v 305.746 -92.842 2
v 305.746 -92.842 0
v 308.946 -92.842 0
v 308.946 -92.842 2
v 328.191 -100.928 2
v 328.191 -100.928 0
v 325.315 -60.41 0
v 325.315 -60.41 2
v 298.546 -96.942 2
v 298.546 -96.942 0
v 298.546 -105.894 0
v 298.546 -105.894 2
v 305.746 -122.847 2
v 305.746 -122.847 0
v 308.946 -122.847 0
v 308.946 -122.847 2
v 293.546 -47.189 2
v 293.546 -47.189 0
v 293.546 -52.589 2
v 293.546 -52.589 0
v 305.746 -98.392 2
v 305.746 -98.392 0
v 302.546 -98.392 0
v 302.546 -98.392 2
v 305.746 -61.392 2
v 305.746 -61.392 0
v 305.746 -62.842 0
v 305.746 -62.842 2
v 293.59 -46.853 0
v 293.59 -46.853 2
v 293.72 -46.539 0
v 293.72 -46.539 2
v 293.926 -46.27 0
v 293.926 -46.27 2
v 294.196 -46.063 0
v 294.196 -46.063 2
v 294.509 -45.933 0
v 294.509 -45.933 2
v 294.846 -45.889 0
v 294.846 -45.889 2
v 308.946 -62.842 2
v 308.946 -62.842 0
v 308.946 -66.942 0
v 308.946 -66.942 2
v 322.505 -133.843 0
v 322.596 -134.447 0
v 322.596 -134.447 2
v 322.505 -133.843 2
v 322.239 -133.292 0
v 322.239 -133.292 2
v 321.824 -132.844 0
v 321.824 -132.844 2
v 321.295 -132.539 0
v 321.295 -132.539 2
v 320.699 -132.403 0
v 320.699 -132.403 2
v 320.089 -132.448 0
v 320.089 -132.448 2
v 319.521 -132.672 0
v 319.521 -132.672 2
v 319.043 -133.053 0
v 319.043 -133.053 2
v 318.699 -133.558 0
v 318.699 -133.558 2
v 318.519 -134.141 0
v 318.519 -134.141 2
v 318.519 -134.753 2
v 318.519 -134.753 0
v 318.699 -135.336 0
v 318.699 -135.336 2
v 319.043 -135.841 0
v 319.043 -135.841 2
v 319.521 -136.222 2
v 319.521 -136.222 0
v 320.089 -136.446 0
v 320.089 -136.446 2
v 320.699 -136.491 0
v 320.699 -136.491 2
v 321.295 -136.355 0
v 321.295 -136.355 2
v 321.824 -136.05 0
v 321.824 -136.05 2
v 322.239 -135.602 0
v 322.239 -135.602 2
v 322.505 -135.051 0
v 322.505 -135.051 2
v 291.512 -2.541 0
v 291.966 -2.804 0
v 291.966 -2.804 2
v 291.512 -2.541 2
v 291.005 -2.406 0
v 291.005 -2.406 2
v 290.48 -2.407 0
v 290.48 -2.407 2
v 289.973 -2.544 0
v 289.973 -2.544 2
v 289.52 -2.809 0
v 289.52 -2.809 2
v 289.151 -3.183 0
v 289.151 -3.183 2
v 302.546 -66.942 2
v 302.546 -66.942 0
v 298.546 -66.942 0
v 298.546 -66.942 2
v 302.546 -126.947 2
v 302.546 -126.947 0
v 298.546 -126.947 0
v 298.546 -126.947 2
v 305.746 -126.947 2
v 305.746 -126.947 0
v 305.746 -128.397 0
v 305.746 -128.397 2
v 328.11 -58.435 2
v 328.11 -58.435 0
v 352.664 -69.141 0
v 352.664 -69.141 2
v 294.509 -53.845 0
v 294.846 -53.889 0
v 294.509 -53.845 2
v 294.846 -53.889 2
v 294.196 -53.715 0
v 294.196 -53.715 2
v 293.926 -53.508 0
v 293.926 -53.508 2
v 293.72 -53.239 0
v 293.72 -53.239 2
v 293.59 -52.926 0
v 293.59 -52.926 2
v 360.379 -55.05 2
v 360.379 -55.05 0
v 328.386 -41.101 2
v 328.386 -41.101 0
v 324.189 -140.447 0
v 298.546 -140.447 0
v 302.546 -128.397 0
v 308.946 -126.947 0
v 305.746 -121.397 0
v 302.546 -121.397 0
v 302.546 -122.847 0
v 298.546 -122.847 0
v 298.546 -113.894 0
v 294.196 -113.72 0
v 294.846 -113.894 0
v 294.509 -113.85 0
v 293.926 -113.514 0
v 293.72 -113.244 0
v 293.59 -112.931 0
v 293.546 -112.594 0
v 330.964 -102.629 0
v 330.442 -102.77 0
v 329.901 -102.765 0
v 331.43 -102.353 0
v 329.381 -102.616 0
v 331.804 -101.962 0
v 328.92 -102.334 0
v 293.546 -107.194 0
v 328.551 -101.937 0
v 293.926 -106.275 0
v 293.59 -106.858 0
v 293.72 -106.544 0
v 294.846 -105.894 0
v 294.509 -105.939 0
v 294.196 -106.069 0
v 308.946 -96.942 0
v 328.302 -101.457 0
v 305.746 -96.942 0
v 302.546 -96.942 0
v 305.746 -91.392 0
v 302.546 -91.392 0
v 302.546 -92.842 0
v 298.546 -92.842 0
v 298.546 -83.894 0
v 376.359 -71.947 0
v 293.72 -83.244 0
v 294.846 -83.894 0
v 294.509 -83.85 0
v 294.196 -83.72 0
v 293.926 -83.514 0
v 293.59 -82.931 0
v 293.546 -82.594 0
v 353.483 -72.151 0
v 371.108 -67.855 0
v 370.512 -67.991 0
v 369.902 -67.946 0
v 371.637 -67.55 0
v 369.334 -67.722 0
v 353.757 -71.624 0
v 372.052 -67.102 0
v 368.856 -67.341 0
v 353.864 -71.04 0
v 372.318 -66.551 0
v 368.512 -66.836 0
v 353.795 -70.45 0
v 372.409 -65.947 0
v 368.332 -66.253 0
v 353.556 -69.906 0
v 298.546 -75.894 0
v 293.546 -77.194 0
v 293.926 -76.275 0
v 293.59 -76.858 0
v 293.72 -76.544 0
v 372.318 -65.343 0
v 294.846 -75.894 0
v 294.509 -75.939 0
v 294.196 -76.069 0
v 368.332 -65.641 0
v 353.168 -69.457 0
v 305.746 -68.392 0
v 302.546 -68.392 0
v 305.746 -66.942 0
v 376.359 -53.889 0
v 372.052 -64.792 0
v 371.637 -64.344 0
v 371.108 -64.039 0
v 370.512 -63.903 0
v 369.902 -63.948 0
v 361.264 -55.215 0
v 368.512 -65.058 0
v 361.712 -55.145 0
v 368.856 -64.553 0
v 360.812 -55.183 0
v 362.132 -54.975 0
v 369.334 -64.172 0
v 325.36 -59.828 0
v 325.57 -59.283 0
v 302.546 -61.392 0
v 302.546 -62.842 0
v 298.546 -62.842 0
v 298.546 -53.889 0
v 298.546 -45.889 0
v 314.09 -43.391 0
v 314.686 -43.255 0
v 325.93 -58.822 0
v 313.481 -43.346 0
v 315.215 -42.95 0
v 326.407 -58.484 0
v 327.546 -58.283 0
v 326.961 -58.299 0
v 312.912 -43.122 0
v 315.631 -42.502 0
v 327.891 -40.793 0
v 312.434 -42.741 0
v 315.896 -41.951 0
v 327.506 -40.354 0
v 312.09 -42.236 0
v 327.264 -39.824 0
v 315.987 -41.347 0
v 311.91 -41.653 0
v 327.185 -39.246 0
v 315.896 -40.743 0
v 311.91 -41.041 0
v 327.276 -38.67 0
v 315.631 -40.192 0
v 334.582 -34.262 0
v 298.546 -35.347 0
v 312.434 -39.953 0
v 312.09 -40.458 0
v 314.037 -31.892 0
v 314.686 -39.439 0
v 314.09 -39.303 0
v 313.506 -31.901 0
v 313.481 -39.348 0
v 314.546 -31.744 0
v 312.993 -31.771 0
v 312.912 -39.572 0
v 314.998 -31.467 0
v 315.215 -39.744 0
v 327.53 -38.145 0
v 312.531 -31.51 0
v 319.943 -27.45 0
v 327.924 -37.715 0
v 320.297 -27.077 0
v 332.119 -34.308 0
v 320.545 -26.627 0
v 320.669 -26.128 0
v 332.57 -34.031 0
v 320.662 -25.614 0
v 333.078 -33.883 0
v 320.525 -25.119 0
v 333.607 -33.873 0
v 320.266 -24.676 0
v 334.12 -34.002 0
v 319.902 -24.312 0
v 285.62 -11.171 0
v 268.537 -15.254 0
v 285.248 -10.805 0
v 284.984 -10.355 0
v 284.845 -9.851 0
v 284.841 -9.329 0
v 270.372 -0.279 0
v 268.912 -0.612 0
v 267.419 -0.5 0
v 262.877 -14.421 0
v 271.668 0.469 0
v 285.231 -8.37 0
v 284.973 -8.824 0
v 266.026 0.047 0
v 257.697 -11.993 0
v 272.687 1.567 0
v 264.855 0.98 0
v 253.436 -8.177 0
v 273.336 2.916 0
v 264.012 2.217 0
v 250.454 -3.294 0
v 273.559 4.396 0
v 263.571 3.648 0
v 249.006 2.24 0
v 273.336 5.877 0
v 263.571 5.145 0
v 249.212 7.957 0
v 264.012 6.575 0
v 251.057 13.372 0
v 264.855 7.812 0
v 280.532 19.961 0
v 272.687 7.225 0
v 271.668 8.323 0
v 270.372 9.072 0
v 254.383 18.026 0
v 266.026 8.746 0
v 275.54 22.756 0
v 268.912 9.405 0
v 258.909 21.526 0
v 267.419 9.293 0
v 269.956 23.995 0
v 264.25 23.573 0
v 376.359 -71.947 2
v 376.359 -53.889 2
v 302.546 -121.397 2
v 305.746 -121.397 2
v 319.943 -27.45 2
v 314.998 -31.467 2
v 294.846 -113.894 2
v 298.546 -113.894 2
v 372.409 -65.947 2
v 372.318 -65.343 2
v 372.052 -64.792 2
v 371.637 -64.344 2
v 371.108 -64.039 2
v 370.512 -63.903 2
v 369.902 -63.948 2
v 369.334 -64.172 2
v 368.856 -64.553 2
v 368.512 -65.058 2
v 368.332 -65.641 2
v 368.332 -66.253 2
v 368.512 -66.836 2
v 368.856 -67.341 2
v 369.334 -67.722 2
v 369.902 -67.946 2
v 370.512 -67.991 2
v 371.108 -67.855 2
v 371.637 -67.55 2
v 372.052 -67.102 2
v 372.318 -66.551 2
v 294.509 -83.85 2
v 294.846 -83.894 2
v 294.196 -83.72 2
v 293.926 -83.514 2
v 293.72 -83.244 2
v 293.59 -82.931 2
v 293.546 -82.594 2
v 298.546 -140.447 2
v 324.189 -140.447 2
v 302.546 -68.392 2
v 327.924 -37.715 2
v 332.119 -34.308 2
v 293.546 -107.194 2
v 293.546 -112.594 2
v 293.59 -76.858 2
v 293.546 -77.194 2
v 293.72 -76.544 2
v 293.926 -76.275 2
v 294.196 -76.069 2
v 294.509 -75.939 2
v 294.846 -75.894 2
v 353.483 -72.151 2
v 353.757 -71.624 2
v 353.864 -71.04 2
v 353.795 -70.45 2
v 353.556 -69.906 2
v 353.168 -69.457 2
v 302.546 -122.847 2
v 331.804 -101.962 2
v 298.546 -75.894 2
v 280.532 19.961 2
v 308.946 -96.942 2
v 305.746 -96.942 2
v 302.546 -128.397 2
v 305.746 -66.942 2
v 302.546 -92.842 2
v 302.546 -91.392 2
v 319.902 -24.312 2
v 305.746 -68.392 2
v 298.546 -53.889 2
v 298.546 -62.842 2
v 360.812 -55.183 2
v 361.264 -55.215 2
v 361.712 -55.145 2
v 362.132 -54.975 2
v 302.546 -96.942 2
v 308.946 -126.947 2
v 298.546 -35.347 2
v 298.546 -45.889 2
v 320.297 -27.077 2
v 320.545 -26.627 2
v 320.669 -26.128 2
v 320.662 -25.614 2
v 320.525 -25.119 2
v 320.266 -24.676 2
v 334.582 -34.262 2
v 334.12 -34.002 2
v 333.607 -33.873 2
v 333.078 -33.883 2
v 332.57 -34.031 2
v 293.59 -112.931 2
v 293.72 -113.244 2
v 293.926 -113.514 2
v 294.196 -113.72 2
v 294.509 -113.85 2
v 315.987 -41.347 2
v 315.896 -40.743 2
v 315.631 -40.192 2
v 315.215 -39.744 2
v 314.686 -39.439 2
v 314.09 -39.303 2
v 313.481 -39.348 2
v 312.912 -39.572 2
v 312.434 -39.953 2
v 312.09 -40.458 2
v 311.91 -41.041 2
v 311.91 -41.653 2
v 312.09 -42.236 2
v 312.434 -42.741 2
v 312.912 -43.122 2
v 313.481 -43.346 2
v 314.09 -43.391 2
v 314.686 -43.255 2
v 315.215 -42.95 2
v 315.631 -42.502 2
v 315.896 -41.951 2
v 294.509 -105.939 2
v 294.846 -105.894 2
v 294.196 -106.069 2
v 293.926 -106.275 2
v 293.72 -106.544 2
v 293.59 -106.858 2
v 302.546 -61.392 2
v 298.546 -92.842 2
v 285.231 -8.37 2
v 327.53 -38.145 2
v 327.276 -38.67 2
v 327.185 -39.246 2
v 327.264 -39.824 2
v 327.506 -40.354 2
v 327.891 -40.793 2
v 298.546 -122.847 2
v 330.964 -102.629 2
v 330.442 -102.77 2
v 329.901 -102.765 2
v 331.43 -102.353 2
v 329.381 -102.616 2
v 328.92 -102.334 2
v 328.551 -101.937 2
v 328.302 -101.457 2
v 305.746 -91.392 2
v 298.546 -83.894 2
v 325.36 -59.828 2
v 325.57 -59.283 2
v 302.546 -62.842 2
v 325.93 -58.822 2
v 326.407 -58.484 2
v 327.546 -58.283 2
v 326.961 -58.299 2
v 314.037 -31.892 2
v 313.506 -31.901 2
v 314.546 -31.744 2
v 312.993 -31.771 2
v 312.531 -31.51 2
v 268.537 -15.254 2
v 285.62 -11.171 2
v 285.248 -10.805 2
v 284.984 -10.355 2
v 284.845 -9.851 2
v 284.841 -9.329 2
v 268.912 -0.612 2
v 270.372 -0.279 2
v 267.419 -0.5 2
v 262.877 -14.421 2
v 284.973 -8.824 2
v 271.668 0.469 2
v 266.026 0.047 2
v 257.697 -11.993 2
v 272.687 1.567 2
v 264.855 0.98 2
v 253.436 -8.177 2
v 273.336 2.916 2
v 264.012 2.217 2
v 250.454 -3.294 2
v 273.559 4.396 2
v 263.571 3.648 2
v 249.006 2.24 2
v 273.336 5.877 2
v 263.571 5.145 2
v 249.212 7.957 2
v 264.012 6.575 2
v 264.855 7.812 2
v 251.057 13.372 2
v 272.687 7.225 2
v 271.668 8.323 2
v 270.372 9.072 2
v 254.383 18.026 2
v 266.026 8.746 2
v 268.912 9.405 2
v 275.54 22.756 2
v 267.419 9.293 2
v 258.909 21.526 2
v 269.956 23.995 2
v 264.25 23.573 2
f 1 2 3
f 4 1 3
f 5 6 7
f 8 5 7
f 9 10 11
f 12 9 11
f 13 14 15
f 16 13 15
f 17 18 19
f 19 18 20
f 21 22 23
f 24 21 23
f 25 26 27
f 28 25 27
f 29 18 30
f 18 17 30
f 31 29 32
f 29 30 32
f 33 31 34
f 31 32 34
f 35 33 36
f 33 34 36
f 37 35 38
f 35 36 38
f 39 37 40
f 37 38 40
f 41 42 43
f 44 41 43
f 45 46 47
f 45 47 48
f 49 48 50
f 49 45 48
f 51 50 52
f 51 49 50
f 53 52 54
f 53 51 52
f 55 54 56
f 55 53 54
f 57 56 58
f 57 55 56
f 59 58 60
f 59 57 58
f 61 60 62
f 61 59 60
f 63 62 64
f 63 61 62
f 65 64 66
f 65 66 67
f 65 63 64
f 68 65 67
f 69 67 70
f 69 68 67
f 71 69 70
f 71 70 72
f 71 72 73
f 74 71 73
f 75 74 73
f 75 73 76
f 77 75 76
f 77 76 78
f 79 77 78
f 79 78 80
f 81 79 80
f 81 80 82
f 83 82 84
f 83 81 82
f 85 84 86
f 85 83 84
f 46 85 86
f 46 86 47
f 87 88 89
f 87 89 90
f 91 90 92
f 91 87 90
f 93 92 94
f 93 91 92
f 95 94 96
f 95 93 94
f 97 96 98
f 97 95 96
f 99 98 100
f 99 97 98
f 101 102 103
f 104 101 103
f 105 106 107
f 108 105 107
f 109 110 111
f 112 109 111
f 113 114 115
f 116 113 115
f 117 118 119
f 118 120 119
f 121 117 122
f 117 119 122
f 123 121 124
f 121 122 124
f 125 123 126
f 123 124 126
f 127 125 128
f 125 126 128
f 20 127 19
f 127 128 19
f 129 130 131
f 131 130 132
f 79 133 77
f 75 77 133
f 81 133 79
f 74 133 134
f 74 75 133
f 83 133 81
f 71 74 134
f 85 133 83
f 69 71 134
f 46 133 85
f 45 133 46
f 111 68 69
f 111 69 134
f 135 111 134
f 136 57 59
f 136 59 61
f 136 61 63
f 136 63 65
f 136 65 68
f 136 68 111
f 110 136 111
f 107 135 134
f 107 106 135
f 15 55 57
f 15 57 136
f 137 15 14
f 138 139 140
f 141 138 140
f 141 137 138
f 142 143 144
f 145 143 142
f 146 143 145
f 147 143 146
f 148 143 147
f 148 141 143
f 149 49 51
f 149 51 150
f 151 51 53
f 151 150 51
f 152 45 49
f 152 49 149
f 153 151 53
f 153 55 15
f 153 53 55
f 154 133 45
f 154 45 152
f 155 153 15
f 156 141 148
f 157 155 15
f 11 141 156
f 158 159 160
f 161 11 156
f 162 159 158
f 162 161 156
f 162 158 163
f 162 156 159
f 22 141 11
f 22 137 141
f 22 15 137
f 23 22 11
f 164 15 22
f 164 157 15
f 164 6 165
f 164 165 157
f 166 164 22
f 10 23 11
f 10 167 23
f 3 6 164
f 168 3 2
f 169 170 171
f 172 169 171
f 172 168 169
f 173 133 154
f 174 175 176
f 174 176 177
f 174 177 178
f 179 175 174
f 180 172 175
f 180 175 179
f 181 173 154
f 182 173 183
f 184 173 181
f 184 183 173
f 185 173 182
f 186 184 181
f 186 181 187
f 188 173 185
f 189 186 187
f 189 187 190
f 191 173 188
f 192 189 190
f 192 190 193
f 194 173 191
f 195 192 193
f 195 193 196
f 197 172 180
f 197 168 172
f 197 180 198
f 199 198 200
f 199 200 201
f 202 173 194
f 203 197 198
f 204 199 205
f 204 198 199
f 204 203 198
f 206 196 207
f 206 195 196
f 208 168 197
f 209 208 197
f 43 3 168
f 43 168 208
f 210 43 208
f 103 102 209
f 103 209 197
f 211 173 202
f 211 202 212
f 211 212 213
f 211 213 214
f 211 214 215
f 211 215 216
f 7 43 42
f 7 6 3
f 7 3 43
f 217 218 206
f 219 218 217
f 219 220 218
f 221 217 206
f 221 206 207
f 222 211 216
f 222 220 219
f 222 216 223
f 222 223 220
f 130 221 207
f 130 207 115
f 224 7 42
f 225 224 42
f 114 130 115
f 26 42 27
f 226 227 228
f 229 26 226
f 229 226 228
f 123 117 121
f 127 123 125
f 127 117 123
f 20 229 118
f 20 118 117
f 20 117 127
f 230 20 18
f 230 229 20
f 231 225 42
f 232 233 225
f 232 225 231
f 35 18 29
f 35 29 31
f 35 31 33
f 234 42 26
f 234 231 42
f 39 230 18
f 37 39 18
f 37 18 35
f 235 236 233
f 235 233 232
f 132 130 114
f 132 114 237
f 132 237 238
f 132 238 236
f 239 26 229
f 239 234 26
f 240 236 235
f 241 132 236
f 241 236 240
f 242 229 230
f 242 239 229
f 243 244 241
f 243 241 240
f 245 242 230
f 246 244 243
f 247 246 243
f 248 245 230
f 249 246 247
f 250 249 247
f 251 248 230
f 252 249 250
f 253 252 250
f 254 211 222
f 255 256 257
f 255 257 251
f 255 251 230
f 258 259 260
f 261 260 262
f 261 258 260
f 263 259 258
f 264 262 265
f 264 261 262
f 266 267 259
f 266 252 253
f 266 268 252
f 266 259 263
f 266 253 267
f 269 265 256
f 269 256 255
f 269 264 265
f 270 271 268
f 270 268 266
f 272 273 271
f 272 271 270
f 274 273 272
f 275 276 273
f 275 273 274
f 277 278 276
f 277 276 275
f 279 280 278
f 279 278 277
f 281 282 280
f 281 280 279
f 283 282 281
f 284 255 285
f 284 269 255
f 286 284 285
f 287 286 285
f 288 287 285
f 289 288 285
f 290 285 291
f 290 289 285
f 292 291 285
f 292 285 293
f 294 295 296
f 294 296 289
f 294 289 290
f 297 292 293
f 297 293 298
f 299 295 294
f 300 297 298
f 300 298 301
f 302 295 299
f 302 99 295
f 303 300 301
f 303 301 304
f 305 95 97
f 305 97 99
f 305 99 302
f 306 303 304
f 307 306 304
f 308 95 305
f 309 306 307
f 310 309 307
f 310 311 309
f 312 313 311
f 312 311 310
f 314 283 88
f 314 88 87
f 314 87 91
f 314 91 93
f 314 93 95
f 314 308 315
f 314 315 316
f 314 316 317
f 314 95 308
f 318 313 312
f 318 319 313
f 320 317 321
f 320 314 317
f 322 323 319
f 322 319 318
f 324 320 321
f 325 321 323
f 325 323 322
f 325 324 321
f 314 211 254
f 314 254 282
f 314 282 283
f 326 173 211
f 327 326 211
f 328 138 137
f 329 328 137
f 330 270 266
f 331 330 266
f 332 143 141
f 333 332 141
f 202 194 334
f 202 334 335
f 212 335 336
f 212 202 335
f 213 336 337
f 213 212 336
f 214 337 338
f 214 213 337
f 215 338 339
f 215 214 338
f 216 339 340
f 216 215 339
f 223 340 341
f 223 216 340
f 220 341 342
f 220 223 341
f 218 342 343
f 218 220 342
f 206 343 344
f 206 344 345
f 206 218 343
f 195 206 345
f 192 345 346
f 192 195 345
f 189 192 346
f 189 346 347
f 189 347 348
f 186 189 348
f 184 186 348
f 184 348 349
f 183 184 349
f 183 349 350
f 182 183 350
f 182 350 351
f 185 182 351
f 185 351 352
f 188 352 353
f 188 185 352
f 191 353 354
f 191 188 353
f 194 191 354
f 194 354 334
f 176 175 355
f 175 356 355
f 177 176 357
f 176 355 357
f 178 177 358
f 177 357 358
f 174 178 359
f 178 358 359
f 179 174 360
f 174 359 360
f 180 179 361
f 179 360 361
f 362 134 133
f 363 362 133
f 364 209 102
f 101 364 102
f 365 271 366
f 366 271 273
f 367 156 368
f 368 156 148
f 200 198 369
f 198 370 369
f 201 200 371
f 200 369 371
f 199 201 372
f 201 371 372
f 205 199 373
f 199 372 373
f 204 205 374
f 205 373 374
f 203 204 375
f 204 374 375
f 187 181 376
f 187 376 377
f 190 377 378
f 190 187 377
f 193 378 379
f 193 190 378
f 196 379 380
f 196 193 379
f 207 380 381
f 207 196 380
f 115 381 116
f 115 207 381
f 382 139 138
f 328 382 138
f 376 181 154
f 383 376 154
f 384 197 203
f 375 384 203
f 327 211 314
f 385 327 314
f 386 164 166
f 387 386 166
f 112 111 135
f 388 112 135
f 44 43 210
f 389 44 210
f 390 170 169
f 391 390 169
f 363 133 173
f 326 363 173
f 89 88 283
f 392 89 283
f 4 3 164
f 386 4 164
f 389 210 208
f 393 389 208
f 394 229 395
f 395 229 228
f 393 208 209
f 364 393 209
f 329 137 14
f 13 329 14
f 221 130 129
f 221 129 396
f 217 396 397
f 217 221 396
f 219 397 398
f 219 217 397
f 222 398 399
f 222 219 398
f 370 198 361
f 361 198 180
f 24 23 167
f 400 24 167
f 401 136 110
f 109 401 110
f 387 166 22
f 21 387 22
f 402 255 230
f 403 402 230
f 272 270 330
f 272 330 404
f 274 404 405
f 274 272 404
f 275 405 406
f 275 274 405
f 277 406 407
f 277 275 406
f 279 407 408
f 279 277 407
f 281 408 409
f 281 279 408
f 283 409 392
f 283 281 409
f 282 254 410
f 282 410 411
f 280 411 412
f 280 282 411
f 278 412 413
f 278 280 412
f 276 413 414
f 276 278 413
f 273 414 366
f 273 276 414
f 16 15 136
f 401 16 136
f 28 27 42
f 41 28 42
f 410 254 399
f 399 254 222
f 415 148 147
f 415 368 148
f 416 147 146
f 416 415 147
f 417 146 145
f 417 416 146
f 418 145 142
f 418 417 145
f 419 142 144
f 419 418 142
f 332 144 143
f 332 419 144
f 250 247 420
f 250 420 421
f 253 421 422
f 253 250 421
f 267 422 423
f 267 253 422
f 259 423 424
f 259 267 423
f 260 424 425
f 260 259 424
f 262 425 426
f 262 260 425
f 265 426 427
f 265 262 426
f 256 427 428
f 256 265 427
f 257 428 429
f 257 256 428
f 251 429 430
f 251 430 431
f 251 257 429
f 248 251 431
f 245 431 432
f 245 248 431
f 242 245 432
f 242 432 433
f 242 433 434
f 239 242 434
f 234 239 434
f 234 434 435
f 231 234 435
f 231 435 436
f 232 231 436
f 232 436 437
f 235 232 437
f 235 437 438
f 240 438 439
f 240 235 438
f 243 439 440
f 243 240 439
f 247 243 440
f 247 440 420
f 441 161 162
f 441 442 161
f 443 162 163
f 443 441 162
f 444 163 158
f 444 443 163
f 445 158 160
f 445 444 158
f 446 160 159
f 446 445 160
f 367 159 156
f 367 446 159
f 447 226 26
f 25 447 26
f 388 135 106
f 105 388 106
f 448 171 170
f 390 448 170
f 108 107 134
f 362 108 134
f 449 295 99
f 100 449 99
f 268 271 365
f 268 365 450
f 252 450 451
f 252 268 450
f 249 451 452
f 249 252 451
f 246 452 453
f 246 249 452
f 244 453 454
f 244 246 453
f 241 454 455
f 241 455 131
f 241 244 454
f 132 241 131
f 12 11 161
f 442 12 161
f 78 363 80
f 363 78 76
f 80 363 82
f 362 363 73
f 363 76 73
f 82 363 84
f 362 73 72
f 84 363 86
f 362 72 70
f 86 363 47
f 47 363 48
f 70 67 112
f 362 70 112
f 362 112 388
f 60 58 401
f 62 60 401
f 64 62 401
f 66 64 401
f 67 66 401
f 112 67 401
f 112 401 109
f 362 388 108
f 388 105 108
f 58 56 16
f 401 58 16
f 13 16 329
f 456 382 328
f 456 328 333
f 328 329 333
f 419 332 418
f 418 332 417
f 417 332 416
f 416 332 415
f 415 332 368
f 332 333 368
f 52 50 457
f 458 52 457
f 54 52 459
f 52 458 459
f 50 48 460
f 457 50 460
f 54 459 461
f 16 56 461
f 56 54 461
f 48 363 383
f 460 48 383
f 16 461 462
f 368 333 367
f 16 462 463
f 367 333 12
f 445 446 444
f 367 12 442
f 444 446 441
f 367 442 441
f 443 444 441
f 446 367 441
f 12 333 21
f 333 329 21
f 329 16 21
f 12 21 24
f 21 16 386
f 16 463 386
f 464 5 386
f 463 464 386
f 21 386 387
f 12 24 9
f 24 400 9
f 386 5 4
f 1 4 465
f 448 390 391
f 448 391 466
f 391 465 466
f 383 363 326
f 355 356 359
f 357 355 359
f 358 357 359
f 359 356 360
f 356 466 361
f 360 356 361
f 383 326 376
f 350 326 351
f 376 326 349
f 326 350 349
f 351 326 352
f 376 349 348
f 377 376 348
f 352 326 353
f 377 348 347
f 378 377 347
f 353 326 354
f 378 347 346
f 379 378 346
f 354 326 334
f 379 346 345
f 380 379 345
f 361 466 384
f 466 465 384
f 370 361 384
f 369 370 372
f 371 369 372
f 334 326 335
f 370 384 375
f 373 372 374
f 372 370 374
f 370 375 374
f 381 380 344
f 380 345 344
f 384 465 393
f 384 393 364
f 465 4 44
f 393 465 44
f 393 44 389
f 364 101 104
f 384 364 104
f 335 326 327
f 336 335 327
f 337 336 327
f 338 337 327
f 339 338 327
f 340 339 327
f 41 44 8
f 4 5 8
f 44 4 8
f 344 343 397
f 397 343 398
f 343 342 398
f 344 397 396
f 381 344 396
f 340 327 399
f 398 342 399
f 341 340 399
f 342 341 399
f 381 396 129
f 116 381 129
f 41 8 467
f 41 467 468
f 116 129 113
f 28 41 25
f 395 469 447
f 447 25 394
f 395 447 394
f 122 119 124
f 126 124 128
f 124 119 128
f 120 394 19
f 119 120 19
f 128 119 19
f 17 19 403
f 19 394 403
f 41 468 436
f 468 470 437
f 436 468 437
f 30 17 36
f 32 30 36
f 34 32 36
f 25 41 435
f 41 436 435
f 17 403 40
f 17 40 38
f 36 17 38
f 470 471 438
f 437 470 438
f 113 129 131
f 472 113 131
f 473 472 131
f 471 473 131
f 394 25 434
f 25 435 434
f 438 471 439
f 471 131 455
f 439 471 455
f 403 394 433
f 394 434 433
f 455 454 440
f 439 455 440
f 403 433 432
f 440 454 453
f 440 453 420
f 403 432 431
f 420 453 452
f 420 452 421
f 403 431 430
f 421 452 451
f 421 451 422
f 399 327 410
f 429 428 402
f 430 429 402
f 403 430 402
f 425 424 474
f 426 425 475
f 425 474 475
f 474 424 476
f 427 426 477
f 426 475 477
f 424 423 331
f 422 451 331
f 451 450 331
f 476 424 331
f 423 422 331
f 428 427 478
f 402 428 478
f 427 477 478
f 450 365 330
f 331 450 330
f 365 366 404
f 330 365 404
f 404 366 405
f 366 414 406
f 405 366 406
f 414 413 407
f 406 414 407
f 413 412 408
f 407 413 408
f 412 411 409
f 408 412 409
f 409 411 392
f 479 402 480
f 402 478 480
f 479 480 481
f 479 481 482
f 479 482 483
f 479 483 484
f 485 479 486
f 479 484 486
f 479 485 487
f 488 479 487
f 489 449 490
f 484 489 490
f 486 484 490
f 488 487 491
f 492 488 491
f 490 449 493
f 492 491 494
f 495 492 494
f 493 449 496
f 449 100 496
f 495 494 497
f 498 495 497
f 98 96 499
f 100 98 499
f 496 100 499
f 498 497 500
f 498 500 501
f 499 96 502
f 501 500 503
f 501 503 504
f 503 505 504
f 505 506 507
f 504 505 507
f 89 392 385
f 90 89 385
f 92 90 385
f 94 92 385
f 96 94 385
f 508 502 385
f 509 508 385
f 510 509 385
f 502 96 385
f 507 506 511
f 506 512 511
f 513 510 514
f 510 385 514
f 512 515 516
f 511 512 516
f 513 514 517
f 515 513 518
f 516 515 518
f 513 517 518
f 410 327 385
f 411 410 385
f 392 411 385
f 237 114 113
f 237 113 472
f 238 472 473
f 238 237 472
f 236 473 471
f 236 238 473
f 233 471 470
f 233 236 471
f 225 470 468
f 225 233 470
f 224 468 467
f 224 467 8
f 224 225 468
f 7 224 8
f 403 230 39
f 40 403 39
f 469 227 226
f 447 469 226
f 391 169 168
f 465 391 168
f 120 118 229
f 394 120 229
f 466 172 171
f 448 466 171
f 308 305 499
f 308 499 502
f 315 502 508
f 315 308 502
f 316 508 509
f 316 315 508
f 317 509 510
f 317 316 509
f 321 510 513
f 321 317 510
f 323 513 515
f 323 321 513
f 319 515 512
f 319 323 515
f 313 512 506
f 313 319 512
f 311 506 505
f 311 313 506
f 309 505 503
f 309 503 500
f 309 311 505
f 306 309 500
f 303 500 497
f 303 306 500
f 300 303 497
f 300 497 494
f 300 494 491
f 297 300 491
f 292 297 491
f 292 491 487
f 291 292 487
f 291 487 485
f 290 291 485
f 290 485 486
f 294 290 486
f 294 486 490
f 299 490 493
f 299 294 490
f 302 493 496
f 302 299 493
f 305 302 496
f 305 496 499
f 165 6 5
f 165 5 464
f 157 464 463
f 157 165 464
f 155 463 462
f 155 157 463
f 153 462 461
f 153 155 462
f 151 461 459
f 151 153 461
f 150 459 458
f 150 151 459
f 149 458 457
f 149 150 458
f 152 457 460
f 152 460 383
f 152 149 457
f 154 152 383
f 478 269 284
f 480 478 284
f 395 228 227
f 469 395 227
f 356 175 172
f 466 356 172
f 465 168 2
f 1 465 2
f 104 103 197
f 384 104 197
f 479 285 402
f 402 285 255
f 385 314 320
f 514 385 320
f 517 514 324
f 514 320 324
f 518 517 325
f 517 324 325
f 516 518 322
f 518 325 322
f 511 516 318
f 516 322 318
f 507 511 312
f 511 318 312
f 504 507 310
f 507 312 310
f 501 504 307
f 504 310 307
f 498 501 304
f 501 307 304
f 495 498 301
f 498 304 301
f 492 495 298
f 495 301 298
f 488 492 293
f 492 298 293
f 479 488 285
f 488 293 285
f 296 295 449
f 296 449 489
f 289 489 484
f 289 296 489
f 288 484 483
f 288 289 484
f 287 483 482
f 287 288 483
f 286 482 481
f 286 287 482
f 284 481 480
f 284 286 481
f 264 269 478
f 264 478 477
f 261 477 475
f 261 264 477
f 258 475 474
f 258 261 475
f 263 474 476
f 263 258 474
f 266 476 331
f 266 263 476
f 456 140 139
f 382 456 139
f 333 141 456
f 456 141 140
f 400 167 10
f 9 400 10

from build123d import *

# Parameters (mm, degrees)
SKETCH_1_R      = 5.0225
SKETCH_1_R_2    = 2.05
EXTRUDE_1_DEPTH = 2
FILLET_1_R      = 2
FILLET_2_R      = 1.3


with BuildPart() as part:
    # 草图1 → 凸台-拉伸1 (new body)
    with BuildSketch(Plane.XY):
        with BuildLine():
            Line((298.545628784, -83.894391363), (298.545628784, -92.841778663))
            Line((298.545628784, -92.841778663), (302.545628784, -92.841778663))
            Line((302.545628784, -92.841778663), (302.545628784, -91.391778663))
            Line((302.545628784, -91.391778663), (305.745628784, -91.391778663))
            Line((305.745628784, -91.391778663), (305.745628784, -92.841778663))
            Line((305.745628784, -92.841778663), (308.945628784, -92.841778663))
            Line((308.945628784, -92.841778663), (308.945628784, -96.941778663))
            Line((308.945628784, -96.941778663), (305.745628784, -96.941778663))
            Line((305.745628784, -96.941778663), (305.745628784, -98.391778663))
            Line((305.745628784, -98.391778663), (302.545628784, -98.391778663))
            Line((302.545628784, -98.391778663), (302.545628784, -96.941778663))
            Line((302.545628784, -96.941778663), (298.545628784, -96.941778663))
            Line((298.545628784, -96.941778663), (298.545628784, -105.894391358))
            Line((298.545628784, -105.894391358), (293.545628784, -105.894391358))
            Line((293.545628784, -105.894391358), (293.545628784, -113.894391358))
            Line((293.545628784, -113.894391358), (298.545628784, -113.894391358))
            Line((298.545628784, -113.894391358), (298.545628784, -122.847004054))
            Line((298.545628784, -122.847004054), (302.545628784, -122.847004054))
            Line((302.545628784, -122.847004054), (302.545628784, -121.397004054))
            Line((302.545628784, -121.397004054), (305.745628784, -121.397004054))
            Line((305.745628784, -121.397004054), (305.745628784, -122.847004054))
            Line((305.745628784, -122.847004054), (308.945628784, -122.847004054))
            Line((308.945628784, -122.847004054), (308.945628784, -126.947004054))
            Line((308.945628784, -126.947004054), (305.745628784, -126.947004054))
            Line((305.745628784, -126.947004054), (305.745628784, -128.397004054))
            Line((305.745628784, -128.397004054), (302.545628784, -128.397004054))
            Line((302.545628784, -128.397004054), (302.545628784, -126.947004054))
            Line((302.545628784, -126.947004054), (298.545628784, -126.947004054))
            Line((298.545628784, -126.947004054), (298.545628784, -140.447004054))
            Line((298.545628784, -140.447004054), (324.188862368, -140.447004054))
            Line((324.188862368, -140.447004054), (376.358604426, -71.946984141))
            Line((376.358604426, -71.946984141), (376.358604426, -53.889165972))
            Line((376.358604426, -53.889165972), (280.531751023, 19.960524179))
            ThreePointArc((280.531751023, 19.960524179), (249.936430553, 10.731954958), (268.536987634, -15.253798847))
            Line((268.536987634, -15.253798847), (298.545628784, -35.346984141))
            Line((298.545628784, -35.346984141), (298.545628784, -45.889165972))
            Line((298.545628784, -45.889165972), (293.545628784, -45.889165972))
            Line((293.545628784, -45.889165972), (293.545628784, -53.889165972))
            Line((293.545628784, -53.889165972), (298.545628784, -53.889165972))
            Line((298.545628784, -53.889165972), (298.545628784, -62.841778668))
            Line((298.545628784, -62.841778668), (302.545628784, -62.841778668))
            Line((302.545628784, -62.841778668), (302.545628784, -61.391778668))
            Line((302.545628784, -61.391778668), (305.745628784, -61.391778668))
            Line((305.745628784, -61.391778668), (305.745628784, -62.841778668))
            Line((305.745628784, -62.841778668), (308.945628784, -62.841778668))
            Line((308.945628784, -62.841778668), (308.945628784, -66.941778668))
            Line((308.945628784, -66.941778668), (305.745628784, -66.941778668))
            Line((305.745628784, -66.941778668), (305.745628784, -68.391778668))
            Line((305.745628784, -68.391778668), (302.545628784, -68.391778668))
            Line((302.545628784, -68.391778668), (302.545628784, -66.941778668))
            Line((302.545628784, -66.941778668), (298.545628784, -66.941778668))
            Line((298.545628784, -66.941778668), (298.545628784, -75.894391363))
            Line((298.545628784, -75.894391363), (293.545628784, -75.894391363))
            Line((293.545628784, -75.894391363), (293.545628784, -83.894391363))
            Line((293.545628784, -83.894391363), (298.545628784, -83.894391363))
        make_face()
        with Locations((268.536987634, 4.396201153)):
            Circle(SKETCH_1_R, mode=Mode.SUBTRACT)
        with Locations((320.545628784, -134.447004054)):
            Circle(SKETCH_1_R_2, mode=Mode.SUBTRACT)
        with Locations((370.358604426, -65.946984141)):
            Circle(SKETCH_1_R_2, mode=Mode.SUBTRACT)
        with Locations((313.936987634, -41.346984141)):
            Circle(SKETCH_1_R_2, mode=Mode.SUBTRACT)
        Polygon((354.947285032, -70.136765586), (328.579617375, -106.396108383), (325.08144343, -57.115165973), align=None, mode=Mode.SUBTRACT)
        Polygon((333.332304748, -33.322065963), (362.131919364, -54.975351392), (362.3086526, -55.891681452), (325.3728981, -39.787577877), align=None, mode=Mode.SUBTRACT)
        Polygon((290.367472723, -1.573041375), (321.906127186, -25.855107664), (313.781314718, -32.454980511), (284.02466426, -9.965407758), align=None, mode=Mode.SUBTRACT)
    extrude(amount=EXTRUDE_1_DEPTH)

    # 圆角1
    # the kernel refuses this fillet: 2 mm, written as the material it adds along each edge
    with BuildSketch(Plane(origin=(325.08144343, -57.115165973, 0), x_dir=(0.07080615119568372, -0.9974900946640293, 0), z_dir=(0, 0, 1))) as fillet_1_piece_1:
        with BuildLine():
            CenterArc((FILLET_1_R * 1.651770121, FILLET_1_R), FILLET_1_R, 152.382357743, 117.617642257)
            Line((FILLET_1_R * 0.765709239798, FILLET_1_R * 1.46356888895), (FILLET_1_R * 0.747988022174, FILLET_1_R * 1.47284026673))
            Line((FILLET_1_R * 0.747988022174, FILLET_1_R * 1.47284026673), (-FILLET_1_R * 0.03303540242, -FILLET_1_R * 0.02))
            Line((-FILLET_1_R * 0.03303540242, -FILLET_1_R * 0.02), (FILLET_1_R * 1.651770121, -FILLET_1_R * 0.02))
            Line((FILLET_1_R * 1.651770121, -FILLET_1_R * 0.02), (FILLET_1_R * 1.651770121, 0))
        make_face()
    extrude(amount=2)
    with BuildSketch(Plane(origin=(328.579617375, -106.396108383, 0), x_dir=(0.5881313815647177, 0.8087654035743471, 0), z_dir=(0, 0, 1))) as fillet_1_piece_2:
        with BuildLine():
            CenterArc((FILLET_1_R * 2.74116347671, FILLET_1_R), FILLET_1_R, 130.084808377, 139.915191623)
            Line((FILLET_1_R * 2.09724268379, FILLET_1_R * 1.76509215945), (FILLET_1_R * 2.08436426794, FILLET_1_R * 1.78039400264))
            Line((FILLET_1_R * 2.08436426794, FILLET_1_R * 1.78039400264), (-FILLET_1_R * 0.0128784158584, FILLET_1_R * 0.0153018431889))
            Line((-FILLET_1_R * 0.0128784158584, FILLET_1_R * 0.0153018431889), (0, -FILLET_1_R * 0.02))
            Line((0, -FILLET_1_R * 0.02), (FILLET_1_R * 2.74116347671, -FILLET_1_R * 0.02))
            Line((FILLET_1_R * 2.74116347671, -FILLET_1_R * 0.02), (FILLET_1_R * 2.74116347671, 0))
        make_face()
    extrude(amount=2)
    with BuildSketch(Plane(origin=(354.947285032, -70.136765586, 0), x_dir=(-0.588131381564712, -0.8087654035743512, 0), z_dir=(0, 0, 1))) as fillet_1_piece_3:
        with BuildLine():
            CenterArc((FILLET_1_R * 1.24524308483, -FILLET_1_R), FILLET_1_R, 90, 102.467166119)
            Line((FILLET_1_R * 0.268823205284, -FILLET_1_R * 1.2158801029), (FILLET_1_R * 0.249294807693, -FILLET_1_R * 1.22019770495))
            Line((FILLET_1_R * 0.249294807693, -FILLET_1_R * 1.22019770495), (-FILLET_1_R * 0.0249048616966, FILLET_1_R * 0.02))
            Line((-FILLET_1_R * 0.0249048616966, FILLET_1_R * 0.02), (FILLET_1_R * 1.24524308483, FILLET_1_R * 0.02))
            Line((FILLET_1_R * 1.24524308483, FILLET_1_R * 0.02), (FILLET_1_R * 1.24524308483, 0))
        make_face()
    extrude(amount=2)
    with BuildSketch(Plane(origin=(362.3086526, -55.891681452, 0), x_dir=(-0.18938048682828962, 0.9819037789970461, 0), z_dir=(0, 0, 1))) as fillet_1_piece_4:
        with BuildLine():
            CenterArc((2.840129073, 0.603066583), FILLET_1_R, 145.526016586, 52.023702881)
            Line((1.191362484, 1.73513051), (1.158387152, 1.757771789))
            Line((1.158387152, 1.757771789), (-0.032975332, 0.022641279))
            Line((-0.032975332, 0.022641279), (0, -0.04))
            ThreePointArc((0, -0.04), (0.466608888, -0.04), (0.895079549, -0.012061332))
            Line((0.895079549, -0.012061332), (0.933217775, 0))
        make_face()
    extrude(amount=2)
    with BuildSketch(Plane(origin=(333.332304748, -33.322065963, 0), x_dir=(0.7992857360296067, -0.60095117287481, 0), z_dir=(0, 0, 1))) as fillet_1_piece_5:
        with BuildLine():
            CenterArc((FILLET_1_R * 0.781642351799, -FILLET_1_R), FILLET_1_R, 90, 76.025379067)
            Line((-FILLET_1_R * 0.188760438175, -FILLET_1_R * 0.758507918948), (-FILLET_1_R * 0.208168493974, -FILLET_1_R * 0.753678077327))
            Line((-FILLET_1_R * 0.208168493974, -FILLET_1_R * 0.753678077327), (-FILLET_1_R * 0.015632847036, FILLET_1_R * 0.02))
            Line((-FILLET_1_R * 0.015632847036, FILLET_1_R * 0.02), (FILLET_1_R * 0.781642351799, FILLET_1_R * 0.02))
            Line((FILLET_1_R * 0.781642351799, FILLET_1_R * 0.02), (FILLET_1_R * 0.781642351799, 0))
        make_face()
    extrude(amount=2)
    with BuildSketch(Plane(origin=(325.3728981, -39.787577877, 0), x_dir=(0.9166604811079961, -0.3996668142026018, 0), z_dir=(0, 0, 1))) as fillet_1_piece_6:
        with BuildLine():
            CenterArc((FILLET_1_R * 1.64326737589, FILLET_1_R), FILLET_1_R, 152.644679345, 117.355320655)
            Line((FILLET_1_R * 0.755093396155, FILLET_1_R * 1.459507325), (FILLET_1_R * 0.737329916561, FILLET_1_R * 1.4686974715))
            Line((FILLET_1_R * 0.737329916561, FILLET_1_R * 1.4686974715), (-FILLET_1_R * 0.0328653475177, -FILLET_1_R * 0.02))
            Line((-FILLET_1_R * 0.0328653475177, -FILLET_1_R * 0.02), (FILLET_1_R * 1.64326737589, -FILLET_1_R * 0.02))
            Line((FILLET_1_R * 1.64326737589, -FILLET_1_R * 0.02), (FILLET_1_R * 1.64326737589, 0))
        make_face()
    extrude(amount=2)
    with BuildSketch(Plane(origin=(321.906127186, -25.855107664, 0), x_dir=(-0.7923621110530705, 0.6100510511158238, 0), z_dir=(0, 0, 1))) as fillet_1_piece_7:
        with BuildLine():
            CenterArc((FILLET_1_R * 1.2643919182, FILLET_1_R), FILLET_1_R, 166.68052265, 103.31947735)
            Line((FILLET_1_R * 0.291291305651, FILLET_1_R * 1.2303805501), (FILLET_1_R * 0.2718292934, FILLET_1_R * 1.2349881611))
            Line((FILLET_1_R * 0.2718292934, FILLET_1_R * 1.2349881611), (-FILLET_1_R * 0.0252878383639, -FILLET_1_R * 0.02))
            Line((-FILLET_1_R * 0.0252878383639, -FILLET_1_R * 0.02), (FILLET_1_R * 1.2643919182, -FILLET_1_R * 0.02))
            Line((FILLET_1_R * 1.2643919182, -FILLET_1_R * 0.02), (FILLET_1_R * 1.2643919182, 0))
        make_face()
    extrude(amount=2)
    with BuildSketch(Plane(origin=(313.781314718, -32.454980511, 0), x_dir=(0.7761858705448689, 0.6305041588812115, 0), z_dir=(0, 0, 1))) as fillet_1_piece_8:
        with BuildLine():
            CenterArc((FILLET_1_R * 0.7836591646, FILLET_1_R), FILLET_1_R, 193.831300809, 76.168699191)
            Line((-FILLET_1_R * 0.187344659052, FILLET_1_R * 0.760936045267), (-FILLET_1_R * 0.206764735525, FILLET_1_R * 0.756154766172))
            Line((-FILLET_1_R * 0.206764735525, FILLET_1_R * 0.756154766172), (-FILLET_1_R * 0.015673183292, -FILLET_1_R * 0.02))
            Line((-FILLET_1_R * 0.015673183292, -FILLET_1_R * 0.02), (FILLET_1_R * 0.7836591646, -FILLET_1_R * 0.02))
            Line((FILLET_1_R * 0.7836591646, -FILLET_1_R * 0.02), (FILLET_1_R * 0.7836591646, 0))
        make_face()
    extrude(amount=2)
    with BuildSketch(Plane(origin=(290.367472723, -1.573041375, 0), x_dir=(0.7923621110530753, -0.6100510511158177, 0), z_dir=(0, 0, 1))) as fillet_1_piece_9:
        with BuildLine():
            CenterArc((FILLET_1_R * 1.00897314279, -FILLET_1_R), FILLET_1_R, 90, 90.511823459)
            Line((FILLET_1_R * 0.00901304180913, -FILLET_1_R * 1.00893288575), (-FILLET_1_R * 0.0109861602105, -FILLET_1_R * 1.00911154346))
            Line((-FILLET_1_R * 0.0109861602105, -FILLET_1_R * 1.00911154346), (-FILLET_1_R * 0.0201794628558, FILLET_1_R * 0.02))
            Line((-FILLET_1_R * 0.0201794628558, FILLET_1_R * 0.02), (FILLET_1_R * 1.00897314279, FILLET_1_R * 0.02))
            Line((FILLET_1_R * 1.00897314279, FILLET_1_R * 0.02), (FILLET_1_R * 1.00897314279, 0))
        make_face()
    extrude(amount=2)
    with BuildSketch(Plane(origin=(284.02466426, -9.965407758, 0), x_dir=(0.7977800129226009, -0.6029486304663231, 0), z_dir=(0, 0, 1))) as fillet_1_piece_10:
        with BuildLine():
            CenterArc((FILLET_1_R, FILLET_1_R), FILLET_1_R, 180, 90)
            Line((0, FILLET_1_R), (-FILLET_1_R * 0.02, FILLET_1_R))
            Line((-FILLET_1_R * 0.02, FILLET_1_R), (-FILLET_1_R * 0.02, -FILLET_1_R * 0.02))
            Line((-FILLET_1_R * 0.02, -FILLET_1_R * 0.02), (FILLET_1_R, -FILLET_1_R * 0.02))
            Line((FILLET_1_R, -FILLET_1_R * 0.02), (FILLET_1_R, 0))
        make_face()
    extrude(amount=2)

    # 圆角2
    fillet_2_edges = [part.edges().sort_by_distance(p)[0] for p in [
        (293.545628784, -113.894391358, 1),
        (293.545628784, -105.894391358, 1),
        (293.545628784, -83.894391363, 1),
        (293.545628784, -75.894391363, 1),
        (293.545628784, -53.889165972, 1),
        (293.545628784, -45.889165972, 1),
    ]]
    fillet(fillet_2_edges, radius=FILLET_2_R)


solid = part.part
